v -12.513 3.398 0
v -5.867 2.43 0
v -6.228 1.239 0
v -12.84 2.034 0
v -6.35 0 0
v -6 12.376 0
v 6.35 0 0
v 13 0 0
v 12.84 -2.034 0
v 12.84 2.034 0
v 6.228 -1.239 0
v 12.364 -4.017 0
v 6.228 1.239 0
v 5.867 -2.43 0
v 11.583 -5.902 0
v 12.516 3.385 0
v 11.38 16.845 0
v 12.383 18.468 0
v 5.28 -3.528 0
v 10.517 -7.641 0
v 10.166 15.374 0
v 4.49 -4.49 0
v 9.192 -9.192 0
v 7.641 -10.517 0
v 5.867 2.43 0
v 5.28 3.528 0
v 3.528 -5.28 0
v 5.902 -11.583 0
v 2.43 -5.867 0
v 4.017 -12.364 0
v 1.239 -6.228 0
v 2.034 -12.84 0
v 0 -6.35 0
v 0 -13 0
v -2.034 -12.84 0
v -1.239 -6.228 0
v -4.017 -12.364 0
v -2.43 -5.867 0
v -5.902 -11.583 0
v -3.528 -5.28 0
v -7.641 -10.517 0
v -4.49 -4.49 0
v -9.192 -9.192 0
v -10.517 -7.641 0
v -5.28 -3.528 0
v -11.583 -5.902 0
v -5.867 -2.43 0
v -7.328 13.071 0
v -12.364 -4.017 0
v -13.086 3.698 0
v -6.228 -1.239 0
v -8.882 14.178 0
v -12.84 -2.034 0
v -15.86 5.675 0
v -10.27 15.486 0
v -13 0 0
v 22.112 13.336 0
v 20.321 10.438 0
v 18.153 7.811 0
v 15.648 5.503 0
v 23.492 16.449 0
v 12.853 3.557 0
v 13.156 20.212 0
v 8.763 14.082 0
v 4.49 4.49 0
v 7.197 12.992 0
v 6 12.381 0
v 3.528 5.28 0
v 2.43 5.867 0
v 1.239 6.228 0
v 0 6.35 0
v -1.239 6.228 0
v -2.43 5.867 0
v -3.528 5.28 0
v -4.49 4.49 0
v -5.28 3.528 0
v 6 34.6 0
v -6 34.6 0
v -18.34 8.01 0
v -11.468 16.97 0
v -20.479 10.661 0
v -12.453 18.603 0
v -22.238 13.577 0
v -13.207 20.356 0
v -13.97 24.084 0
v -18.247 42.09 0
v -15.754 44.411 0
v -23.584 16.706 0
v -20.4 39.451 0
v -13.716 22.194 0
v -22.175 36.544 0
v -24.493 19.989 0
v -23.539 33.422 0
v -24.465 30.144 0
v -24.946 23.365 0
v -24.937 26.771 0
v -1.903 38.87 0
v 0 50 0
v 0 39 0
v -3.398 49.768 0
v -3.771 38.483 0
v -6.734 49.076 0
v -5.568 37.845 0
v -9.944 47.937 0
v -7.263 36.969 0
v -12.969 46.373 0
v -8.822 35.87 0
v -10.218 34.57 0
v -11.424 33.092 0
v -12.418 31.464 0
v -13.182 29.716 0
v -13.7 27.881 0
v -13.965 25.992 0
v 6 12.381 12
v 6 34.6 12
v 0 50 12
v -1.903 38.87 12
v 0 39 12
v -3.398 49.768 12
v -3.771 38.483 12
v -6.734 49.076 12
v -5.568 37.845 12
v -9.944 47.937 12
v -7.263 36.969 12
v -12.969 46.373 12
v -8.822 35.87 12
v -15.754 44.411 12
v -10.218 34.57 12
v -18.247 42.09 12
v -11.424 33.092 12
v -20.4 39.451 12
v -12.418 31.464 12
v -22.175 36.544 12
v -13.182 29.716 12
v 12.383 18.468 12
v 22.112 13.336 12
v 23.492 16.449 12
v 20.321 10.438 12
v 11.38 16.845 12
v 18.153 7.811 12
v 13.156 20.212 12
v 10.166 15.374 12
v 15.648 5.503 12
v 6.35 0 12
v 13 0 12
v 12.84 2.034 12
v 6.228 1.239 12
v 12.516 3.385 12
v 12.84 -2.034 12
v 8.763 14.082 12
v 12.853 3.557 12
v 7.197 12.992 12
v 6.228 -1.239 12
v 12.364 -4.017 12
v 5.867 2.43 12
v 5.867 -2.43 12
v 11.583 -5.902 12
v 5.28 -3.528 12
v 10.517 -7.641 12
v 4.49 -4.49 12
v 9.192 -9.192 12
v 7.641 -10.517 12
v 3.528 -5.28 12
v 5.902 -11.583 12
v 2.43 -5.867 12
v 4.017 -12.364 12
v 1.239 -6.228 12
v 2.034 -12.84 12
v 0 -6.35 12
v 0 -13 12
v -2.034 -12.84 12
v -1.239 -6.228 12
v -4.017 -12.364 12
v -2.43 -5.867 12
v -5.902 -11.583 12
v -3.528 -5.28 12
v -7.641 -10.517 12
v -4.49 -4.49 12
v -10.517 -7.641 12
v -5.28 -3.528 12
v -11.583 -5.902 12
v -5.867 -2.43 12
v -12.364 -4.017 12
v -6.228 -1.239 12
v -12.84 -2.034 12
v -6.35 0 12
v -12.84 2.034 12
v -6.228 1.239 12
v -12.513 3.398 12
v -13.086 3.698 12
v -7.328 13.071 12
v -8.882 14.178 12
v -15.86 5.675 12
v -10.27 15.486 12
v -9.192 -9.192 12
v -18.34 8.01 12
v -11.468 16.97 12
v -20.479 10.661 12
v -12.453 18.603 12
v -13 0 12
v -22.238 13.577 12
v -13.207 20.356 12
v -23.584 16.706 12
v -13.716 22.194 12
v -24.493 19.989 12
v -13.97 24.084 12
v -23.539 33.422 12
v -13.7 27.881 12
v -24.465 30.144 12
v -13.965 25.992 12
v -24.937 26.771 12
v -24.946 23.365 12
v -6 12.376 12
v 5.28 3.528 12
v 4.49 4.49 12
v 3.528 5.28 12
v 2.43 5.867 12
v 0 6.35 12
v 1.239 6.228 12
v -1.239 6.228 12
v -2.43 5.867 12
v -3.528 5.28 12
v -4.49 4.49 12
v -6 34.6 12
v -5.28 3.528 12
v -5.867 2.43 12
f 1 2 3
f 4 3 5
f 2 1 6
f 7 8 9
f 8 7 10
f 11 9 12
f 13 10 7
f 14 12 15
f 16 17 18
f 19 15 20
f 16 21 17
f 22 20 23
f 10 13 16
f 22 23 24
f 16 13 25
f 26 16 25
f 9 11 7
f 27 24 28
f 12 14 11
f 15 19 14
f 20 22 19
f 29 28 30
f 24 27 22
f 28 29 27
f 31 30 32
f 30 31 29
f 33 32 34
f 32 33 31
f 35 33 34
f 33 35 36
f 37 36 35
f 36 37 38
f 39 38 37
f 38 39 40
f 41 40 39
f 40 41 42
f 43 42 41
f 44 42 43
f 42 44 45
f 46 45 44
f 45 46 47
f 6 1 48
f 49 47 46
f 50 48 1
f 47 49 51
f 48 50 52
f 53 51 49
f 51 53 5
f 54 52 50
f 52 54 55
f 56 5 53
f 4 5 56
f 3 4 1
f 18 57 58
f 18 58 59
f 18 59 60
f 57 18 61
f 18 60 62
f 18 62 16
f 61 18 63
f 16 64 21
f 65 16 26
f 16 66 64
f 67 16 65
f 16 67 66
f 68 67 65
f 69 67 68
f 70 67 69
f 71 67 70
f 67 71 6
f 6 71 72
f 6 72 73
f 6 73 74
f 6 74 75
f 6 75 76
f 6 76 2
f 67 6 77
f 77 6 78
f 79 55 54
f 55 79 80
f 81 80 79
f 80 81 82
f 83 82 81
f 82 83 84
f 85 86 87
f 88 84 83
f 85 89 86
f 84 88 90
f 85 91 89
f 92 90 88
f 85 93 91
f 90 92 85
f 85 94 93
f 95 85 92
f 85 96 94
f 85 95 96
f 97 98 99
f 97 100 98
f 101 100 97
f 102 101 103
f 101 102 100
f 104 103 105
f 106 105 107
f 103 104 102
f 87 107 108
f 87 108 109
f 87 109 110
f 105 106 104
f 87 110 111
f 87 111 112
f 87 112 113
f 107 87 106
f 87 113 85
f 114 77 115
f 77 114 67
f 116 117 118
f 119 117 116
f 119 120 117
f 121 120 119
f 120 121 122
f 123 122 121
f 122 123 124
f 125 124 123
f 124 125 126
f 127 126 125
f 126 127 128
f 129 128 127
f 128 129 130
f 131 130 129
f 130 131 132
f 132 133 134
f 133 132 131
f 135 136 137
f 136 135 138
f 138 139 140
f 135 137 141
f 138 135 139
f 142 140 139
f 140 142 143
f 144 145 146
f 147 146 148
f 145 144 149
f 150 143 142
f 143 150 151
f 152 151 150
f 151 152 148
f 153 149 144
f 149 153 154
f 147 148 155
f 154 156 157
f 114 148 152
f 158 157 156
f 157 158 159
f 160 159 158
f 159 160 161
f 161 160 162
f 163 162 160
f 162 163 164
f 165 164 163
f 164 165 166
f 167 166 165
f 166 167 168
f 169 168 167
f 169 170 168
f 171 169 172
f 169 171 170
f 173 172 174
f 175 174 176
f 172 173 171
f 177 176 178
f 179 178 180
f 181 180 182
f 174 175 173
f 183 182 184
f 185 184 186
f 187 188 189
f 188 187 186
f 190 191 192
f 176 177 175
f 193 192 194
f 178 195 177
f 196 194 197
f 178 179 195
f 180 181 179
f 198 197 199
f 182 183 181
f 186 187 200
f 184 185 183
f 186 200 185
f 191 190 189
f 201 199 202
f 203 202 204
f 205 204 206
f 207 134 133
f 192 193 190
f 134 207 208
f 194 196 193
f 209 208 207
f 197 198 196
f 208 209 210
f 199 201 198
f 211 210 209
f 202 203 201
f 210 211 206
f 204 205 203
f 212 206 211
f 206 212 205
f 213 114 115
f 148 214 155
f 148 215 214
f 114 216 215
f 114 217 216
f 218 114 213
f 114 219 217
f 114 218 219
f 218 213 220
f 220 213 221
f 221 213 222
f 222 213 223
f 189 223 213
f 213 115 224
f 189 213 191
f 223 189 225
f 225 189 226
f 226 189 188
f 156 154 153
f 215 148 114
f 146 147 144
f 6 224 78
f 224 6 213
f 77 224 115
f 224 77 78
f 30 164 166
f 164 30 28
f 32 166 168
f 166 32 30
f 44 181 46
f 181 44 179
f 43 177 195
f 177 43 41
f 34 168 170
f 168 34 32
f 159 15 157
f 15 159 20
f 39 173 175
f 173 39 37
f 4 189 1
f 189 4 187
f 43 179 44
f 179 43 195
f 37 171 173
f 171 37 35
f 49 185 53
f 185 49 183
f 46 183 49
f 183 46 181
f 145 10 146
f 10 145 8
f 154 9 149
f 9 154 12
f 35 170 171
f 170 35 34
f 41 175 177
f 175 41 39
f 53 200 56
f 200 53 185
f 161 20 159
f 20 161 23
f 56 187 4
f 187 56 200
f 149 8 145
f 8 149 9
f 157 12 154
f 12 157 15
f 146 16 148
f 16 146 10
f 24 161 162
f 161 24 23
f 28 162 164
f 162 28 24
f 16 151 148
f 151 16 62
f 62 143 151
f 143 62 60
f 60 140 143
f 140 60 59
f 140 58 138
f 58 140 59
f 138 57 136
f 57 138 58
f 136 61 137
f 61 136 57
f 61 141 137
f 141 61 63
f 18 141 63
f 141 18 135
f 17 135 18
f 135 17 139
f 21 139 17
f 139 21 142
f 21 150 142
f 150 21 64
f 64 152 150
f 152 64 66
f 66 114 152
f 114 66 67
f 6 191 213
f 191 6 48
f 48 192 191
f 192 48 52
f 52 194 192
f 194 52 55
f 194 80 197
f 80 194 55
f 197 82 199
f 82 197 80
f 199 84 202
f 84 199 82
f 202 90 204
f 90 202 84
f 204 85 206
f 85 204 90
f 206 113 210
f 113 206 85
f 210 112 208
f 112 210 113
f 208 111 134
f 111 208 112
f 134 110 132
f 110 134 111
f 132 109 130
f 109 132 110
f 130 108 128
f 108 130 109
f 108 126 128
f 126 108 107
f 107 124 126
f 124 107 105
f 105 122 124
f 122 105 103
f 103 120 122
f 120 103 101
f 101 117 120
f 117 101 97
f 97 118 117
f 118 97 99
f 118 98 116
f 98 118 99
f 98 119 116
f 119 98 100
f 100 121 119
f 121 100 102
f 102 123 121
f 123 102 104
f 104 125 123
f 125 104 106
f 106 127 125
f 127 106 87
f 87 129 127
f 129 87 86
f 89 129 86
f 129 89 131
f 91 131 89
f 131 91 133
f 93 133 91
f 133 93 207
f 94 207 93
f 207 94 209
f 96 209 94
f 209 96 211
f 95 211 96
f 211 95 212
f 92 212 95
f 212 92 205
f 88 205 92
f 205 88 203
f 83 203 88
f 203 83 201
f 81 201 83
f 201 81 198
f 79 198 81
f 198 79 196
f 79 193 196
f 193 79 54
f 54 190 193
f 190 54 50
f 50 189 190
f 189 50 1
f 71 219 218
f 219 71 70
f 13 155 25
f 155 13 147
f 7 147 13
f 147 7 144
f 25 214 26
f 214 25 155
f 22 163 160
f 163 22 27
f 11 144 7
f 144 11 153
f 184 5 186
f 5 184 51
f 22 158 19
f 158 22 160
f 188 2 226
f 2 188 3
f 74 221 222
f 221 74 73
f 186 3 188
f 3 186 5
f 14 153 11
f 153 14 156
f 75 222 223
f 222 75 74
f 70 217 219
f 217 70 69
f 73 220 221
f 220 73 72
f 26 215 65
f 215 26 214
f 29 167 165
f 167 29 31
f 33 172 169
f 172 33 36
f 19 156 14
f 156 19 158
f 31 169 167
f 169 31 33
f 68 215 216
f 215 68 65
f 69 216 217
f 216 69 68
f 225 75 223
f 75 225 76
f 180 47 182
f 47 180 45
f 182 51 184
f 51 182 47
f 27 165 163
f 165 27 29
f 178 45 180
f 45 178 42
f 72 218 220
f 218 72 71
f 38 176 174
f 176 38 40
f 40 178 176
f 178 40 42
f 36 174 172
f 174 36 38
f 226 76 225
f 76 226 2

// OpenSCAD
$fn = 32;

// ----------------------------------------------------------------------
// Hook: 50 mm shank into a 14 mm curl, 12 mm thick
// ----------------------------------------------------------------------

// --- parameters (mm) ---
shank_len = 50;           // shank length from the boss centre
shank_w = 12;             // shank width
boss_d = 26;              // boss diameter
bore_d = 12.7;            // boss bore
curl_in = 14;             // curl inner radius
curl_out = 25;            // curl outer radius
curl_sweep = 250;         // curl sweep angle
hook_t = 12;              // hook thickness

shank_profile = [[-6, 34.6], [6, 34.6], [6, 11], [-6, 11]];
boss_profile = [[13, 0], [12.84, 2.034], [12.364, 4.017], [11.583, 5.902], [10.517, 7.641], [9.192, 9.192], [7.641, 10.517], [5.902, 11.583], [4.017, 12.364], [2.034, 12.84], [0, 13], [-2.034, 12.84], [-4.017, 12.364], [-5.902, 11.583], [-7.641, 10.517], [-9.192, 9.192], [-10.517, 7.641], [-11.583, 5.902], [-12.364, 4.017], [-12.84, 2.034], [-13, 0], [-12.84, -2.034], [-12.364, -4.017], [-11.583, -5.902], [-10.517, -7.641], [-9.192, -9.192], [-7.641, -10.517], [-5.902, -11.583], [-4.017, -12.364], [-2.034, -12.84], [0, -13], [2.034, -12.84], [4.017, -12.364], [5.902, -11.583], [7.641, -10.517], [9.192, -9.192], [10.517, -7.641], [11.583, -5.902], [12.364, -4.017], [12.84, -2.034]];
curl_profile = [[0, 50], [-3.398, 49.768], [-6.734, 49.076], [-9.944, 47.937], [-12.969, 46.373], [-15.754, 44.411], [-18.247, 42.09], [-20.4, 39.451], [-22.175, 36.544], [-23.539, 33.422], [-24.465, 30.144], [-24.937, 26.771], [-24.946, 23.365], [-24.493, 19.989], [-23.584, 16.706], [-22.238, 13.577], [-20.479, 10.661], [-18.34, 8.01], [-15.86, 5.675], [-13.086, 3.698], [-10.069, 2.117], [-6.865, 0.961], [-3.533, 0.251], [-0.136, 0], [3.263, 0.214], [6.602, 0.888], [9.818, 2.009], [12.853, 3.557], [15.648, 5.503], [18.153, 7.811], [20.321, 10.438], [22.112, 13.336], [23.492, 16.449], [13.156, 20.212], [12.383, 18.468], [11.38, 16.845], [10.166, 15.374], [8.763, 14.082], [7.197, 12.992], [5.498, 12.125], [3.697, 11.497], [1.827, 11.12], [-0.076, 11], [-1.979, 11.141], [-3.844, 11.538], [-5.638, 12.186], [-7.328, 13.071], [-8.882, 14.178], [-10.27, 15.486], [-11.468, 16.97], [-12.453, 18.603], [-13.207, 20.356], [-13.716, 22.194], [-13.97, 24.084], [-13.965, 25.992], [-13.7, 27.881], [-13.182, 29.716], [-12.418, 31.464], [-11.424, 33.092], [-10.218, 34.57], [-8.822, 35.87], [-7.263, 36.969], [-5.568, 37.845], [-3.771, 38.483], [-1.903, 38.87], [0, 39]];

difference() {
  union() {
    /* three overlapping outlines: shank, boss and the smooth curl */
    linear_extrude(height = hook_t) polygon(shank_profile);
    linear_extrude(height = hook_t) polygon(boss_profile);
    linear_extrude(height = hook_t) polygon(curl_profile);
  }
  translate([0, 0, -2.5]) cylinder(h = hook_t + 5, d = bore_d);
}
